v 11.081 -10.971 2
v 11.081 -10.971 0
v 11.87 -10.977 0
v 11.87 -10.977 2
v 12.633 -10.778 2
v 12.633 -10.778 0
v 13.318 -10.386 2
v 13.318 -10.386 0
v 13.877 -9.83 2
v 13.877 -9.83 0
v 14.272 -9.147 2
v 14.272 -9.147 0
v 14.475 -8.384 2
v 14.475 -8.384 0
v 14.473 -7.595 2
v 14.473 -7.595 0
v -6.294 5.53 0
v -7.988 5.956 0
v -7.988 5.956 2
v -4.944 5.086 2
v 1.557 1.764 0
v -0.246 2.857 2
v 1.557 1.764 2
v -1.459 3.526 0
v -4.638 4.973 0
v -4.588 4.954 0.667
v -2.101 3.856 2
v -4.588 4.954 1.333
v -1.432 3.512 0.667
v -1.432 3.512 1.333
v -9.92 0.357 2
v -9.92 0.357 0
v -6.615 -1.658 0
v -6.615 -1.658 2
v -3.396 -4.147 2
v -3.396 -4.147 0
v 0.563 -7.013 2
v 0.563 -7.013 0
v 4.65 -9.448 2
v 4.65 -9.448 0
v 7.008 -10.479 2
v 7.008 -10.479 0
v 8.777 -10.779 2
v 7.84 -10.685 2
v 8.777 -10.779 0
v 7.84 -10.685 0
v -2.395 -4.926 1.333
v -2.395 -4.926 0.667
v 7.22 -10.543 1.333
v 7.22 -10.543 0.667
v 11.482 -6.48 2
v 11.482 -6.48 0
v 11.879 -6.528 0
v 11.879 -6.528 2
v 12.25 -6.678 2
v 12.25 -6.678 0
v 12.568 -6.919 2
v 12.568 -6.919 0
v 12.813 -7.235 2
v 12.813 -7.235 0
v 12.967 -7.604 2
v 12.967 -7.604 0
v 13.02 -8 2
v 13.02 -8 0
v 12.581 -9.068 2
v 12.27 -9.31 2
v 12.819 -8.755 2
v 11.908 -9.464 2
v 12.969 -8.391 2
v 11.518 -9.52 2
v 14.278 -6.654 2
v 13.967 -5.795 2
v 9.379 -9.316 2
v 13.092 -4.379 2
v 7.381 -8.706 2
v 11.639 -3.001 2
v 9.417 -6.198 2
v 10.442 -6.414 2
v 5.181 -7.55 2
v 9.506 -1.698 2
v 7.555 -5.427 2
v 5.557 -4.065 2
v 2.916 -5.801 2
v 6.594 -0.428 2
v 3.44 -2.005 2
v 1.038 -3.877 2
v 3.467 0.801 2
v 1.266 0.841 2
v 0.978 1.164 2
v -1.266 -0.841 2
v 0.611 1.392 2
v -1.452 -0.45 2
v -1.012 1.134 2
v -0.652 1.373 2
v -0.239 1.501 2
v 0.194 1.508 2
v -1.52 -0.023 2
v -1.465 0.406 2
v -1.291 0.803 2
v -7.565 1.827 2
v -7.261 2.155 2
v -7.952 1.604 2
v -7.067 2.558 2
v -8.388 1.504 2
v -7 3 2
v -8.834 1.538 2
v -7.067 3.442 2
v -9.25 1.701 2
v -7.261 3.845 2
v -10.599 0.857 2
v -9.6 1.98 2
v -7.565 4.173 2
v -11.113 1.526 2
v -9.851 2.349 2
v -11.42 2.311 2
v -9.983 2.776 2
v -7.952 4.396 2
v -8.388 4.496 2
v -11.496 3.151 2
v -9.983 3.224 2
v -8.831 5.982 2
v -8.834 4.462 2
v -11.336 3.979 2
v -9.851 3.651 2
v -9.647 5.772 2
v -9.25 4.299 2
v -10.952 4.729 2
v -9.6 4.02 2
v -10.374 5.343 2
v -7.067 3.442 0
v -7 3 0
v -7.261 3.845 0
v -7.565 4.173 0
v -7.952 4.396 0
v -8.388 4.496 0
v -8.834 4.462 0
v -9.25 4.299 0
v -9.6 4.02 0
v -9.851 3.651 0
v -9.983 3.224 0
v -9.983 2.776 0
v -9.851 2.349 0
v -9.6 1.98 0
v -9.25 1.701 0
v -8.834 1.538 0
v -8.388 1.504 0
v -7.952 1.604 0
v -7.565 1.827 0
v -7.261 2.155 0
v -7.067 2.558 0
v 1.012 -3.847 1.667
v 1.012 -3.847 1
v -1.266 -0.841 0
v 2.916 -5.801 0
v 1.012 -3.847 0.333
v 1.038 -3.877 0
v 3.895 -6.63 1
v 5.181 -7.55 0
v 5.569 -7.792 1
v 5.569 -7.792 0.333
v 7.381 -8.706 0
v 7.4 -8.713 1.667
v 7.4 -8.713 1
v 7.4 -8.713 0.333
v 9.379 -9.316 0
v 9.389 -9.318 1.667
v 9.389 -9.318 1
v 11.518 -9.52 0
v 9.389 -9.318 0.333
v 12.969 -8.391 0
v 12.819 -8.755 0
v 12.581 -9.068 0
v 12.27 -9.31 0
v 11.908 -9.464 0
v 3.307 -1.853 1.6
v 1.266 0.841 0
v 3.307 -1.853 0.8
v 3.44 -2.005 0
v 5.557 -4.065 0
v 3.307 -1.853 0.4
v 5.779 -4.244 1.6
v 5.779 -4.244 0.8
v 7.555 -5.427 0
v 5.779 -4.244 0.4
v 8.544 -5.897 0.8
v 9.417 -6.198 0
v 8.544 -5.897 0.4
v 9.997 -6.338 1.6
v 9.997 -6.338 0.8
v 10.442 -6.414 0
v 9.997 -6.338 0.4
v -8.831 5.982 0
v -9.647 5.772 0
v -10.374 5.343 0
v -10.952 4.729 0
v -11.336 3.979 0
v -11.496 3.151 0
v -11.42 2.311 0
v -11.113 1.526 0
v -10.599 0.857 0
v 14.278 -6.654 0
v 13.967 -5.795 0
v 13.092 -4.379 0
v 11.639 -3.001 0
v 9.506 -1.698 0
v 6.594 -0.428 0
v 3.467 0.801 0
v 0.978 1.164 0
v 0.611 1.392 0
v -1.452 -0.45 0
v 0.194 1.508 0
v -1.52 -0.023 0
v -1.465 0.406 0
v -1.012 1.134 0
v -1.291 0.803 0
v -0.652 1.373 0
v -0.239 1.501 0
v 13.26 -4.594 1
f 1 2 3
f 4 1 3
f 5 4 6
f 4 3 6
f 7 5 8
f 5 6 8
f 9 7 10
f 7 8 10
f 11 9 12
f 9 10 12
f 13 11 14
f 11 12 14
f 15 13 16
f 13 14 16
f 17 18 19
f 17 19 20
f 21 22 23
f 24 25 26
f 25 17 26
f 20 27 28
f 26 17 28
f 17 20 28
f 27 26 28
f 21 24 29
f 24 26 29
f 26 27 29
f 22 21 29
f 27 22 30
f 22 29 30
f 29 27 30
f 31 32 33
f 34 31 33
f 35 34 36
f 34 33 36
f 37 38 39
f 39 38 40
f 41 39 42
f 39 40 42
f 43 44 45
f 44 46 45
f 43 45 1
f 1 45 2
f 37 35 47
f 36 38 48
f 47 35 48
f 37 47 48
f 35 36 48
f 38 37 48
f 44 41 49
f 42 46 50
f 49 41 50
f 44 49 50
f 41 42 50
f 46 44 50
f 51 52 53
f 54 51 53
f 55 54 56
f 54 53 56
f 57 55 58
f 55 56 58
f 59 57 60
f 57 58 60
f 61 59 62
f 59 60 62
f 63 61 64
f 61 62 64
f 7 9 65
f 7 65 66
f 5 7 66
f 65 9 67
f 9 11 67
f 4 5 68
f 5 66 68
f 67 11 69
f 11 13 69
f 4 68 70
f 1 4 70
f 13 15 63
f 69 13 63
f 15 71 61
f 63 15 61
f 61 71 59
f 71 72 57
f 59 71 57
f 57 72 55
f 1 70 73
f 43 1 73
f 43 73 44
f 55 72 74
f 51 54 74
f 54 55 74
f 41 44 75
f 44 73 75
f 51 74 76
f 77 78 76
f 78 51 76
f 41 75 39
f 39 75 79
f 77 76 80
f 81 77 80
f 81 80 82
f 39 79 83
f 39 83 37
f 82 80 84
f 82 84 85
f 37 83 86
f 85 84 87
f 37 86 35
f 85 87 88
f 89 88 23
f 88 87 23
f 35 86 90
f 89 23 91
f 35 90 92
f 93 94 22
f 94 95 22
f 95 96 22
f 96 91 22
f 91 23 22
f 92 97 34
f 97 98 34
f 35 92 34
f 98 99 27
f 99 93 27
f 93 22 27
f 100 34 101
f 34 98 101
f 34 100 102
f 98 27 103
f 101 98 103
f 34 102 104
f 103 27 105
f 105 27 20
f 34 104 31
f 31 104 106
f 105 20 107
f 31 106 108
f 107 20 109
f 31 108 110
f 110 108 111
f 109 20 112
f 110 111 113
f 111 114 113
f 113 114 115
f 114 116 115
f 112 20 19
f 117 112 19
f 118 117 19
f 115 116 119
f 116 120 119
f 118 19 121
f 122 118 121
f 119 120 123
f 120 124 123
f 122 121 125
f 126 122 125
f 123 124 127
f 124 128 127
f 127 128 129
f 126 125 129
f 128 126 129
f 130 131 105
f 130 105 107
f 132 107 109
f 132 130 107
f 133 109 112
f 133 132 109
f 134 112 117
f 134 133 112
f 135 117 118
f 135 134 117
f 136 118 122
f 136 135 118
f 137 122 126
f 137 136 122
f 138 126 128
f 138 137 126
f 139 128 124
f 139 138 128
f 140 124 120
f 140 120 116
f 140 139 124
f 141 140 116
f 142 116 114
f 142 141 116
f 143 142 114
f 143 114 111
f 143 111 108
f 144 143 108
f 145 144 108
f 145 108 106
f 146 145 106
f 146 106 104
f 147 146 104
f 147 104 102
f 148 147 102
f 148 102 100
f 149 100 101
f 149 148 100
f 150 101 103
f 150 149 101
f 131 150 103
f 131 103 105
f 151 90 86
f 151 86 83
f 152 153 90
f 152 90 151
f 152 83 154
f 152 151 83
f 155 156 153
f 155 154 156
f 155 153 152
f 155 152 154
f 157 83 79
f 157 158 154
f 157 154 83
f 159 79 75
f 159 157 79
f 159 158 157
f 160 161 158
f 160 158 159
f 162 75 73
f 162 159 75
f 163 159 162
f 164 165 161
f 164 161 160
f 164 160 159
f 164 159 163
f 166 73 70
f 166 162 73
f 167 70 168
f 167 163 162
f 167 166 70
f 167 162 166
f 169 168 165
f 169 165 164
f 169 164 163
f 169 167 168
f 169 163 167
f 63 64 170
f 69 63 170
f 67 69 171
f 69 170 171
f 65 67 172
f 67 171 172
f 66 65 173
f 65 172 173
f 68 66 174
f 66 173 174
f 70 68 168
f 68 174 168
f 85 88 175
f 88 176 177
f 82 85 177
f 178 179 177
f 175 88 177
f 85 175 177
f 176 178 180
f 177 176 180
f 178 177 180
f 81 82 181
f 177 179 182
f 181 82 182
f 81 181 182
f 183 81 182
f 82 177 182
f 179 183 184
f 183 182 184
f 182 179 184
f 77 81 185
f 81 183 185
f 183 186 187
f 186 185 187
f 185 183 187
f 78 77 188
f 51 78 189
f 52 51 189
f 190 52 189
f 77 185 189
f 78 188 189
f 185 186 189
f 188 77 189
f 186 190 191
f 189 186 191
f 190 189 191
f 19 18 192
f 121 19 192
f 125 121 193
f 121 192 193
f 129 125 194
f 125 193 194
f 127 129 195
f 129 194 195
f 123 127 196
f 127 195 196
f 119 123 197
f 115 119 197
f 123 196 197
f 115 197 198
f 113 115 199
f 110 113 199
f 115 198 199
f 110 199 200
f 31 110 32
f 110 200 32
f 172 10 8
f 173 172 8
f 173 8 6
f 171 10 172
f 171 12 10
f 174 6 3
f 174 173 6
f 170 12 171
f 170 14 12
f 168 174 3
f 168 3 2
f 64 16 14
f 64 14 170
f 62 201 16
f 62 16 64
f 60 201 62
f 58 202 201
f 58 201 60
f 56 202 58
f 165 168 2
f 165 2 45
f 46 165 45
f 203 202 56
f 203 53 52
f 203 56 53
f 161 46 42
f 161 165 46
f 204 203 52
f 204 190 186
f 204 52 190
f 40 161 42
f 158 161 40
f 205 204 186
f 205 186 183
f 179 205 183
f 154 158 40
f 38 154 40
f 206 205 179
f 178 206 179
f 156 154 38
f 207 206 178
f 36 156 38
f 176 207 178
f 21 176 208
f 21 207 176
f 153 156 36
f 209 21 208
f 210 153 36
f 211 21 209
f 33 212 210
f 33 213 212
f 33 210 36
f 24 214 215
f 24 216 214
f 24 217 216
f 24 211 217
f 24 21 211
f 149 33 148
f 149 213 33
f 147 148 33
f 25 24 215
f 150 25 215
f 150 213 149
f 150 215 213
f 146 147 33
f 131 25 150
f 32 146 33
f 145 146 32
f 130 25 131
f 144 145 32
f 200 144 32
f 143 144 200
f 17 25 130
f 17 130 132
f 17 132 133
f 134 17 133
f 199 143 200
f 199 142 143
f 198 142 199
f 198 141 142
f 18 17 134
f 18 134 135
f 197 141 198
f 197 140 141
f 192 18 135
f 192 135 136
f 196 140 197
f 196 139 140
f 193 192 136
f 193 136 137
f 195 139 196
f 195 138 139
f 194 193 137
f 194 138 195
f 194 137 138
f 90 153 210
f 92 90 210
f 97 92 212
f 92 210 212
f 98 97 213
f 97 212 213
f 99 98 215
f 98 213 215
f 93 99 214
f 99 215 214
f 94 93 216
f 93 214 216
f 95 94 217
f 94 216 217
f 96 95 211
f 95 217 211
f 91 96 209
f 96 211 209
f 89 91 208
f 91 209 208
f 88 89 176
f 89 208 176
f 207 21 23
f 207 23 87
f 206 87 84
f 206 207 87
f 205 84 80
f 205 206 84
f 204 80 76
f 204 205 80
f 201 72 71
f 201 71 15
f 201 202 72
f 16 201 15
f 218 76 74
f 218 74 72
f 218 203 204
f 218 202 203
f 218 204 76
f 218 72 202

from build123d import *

# Parameters (mm, degrees)
SKETCH_1_R          = 1.5
EXTRUDE_1_DEPTH     = 2
EXTRUDE_START       = -2
EXTRUDE_2_DEPTH     = 2
CUT_EXTRUDE_6_DEPTH = 10
EXTRUDE_3_DEPTH     = 2


with BuildPart() as part:
    # 草图1 → 凸台-拉伸1 (new body)
    with BuildSketch(Plane.XY):
        with BuildLine():
            add(Edge.make_bspline(
                [(-7.987888182, 5.955967098), (-3.743831448, 6.072814335), (1.964500208, 2.606366835), (9.971098404, -1.64370968), (11.281519782, -4.915475191), (12.099924554, -5.060596909)],
                knots=[0, 0, 0, 0, 0.492049643, 0.9167731, 1, 1, 1, 1], degree=3))
            ThreePointArc((-7.987888182, 5.955967098), (-11.335902649, 3.978599082), (-9.919857427, 0.35727321))
            add(Edge.make_bspline(
                [(-9.919857427, 0.35727321), (-6.214513301, -1.633496474), (-3.207757144, -4.777239805), (7.078147627, -11.27345607), (9.126976019, -10.694820948), (11.080759462, -10.970561794)],
                knots=[0, 0, 0, 0, 0.359134016, 0.783116461, 1, 1, 1, 1], degree=3))
            ThreePointArc((11.080759462, -10.970561794), (14.456363123, -8.509820643), (12.099924554, -5.060596909))
        make_face()
        with BuildLine():
            ThreePointArc((-1.266260939, -0.840822951), (-0.840822951, 1.266260939), (1.266260939, 0.840822951))
            add(Edge.make_bspline(
                [(1.266260939, 0.840822951), (1.572421217, 0.37975228), (2.2006023, -0.51199535), (3.651531179, -2.318328255), (5.731244794, -4.36936802), (8.515750536, -6.078268968), (10.483635949, -6.491801521), (11.482195768, -6.480104277)],
                knots=[0, 0, 0, 0, 0.125, 0.25, 0.5, 0.75, 1, 1, 1, 1], degree=3))
            ThreePointArc((11.482195768, -6.480104277), (12.568489019, -6.918921272), (13.02, -8))
            ThreePointArc((13.02, -8), (12.581078728, -9.068489019), (11.517804232, -9.519895723))
            add(Edge.make_bspline(
                [(-1.266260939, -0.840822951), (-0.926702959, -1.352189828), (-0.233155533, -2.337077502), (1.395542848, -4.364895632), (3.78940322, -6.741408475), (6.71258634, -8.559402396), (9.358185118, -9.384824122), (10.805124931, -9.52824413), (11.517804232, -9.519895723)],
                knots=[0, 0, 0, 0, 0.125, 0.25, 0.5, 0.75, 0.875, 1, 1, 1, 1], degree=3))
        make_face(mode=Mode.SUBTRACT)
        with Locations((-8.5, 3)):
            Circle(SKETCH_1_R, mode=Mode.SUBTRACT)
    extrude(amount=EXTRUDE_1_DEPTH)

    # 草图2 → 凸台-拉伸2 (add)
    with BuildSketch(Plane.XY.offset(2).offset(EXTRUDE_START)):
        with BuildLine():
            ThreePointArc((12.382013346, -5.132587847), (12.241842746, -5.093168505), (12.099924554, -5.060596909))
            add(Edge.make_bspline(
                [(12.099924554, -5.060596909), (11.281519782, -4.915475191), (10.976298239, -4.153420073), (10.521531787, -3.451743028), (10.374807656, -3.248589277)],
                knots=[0, 0, 0, 0, 0.0832269, 0.118311098, 0.118311098, 0.118311098, 0.118311098], degree=3))
            add(Edge.make_bspline(
                [(10.374807656, -3.248589277), (10.663783201, -3.648703868), (11.898898367, -4.983982122), (12.382013346, -5.132587847)],
                knots=[0, 0, 0, 0, 1, 1, 1, 1], degree=3))
        make_face()
    extrude(amount=EXTRUDE_2_DEPTH)

    # 草图7 → 切除-拉伸6 (cut)
    with BuildSketch(Plane.XY.offset(2)):
        with BuildLine():
            Line((-7.987888182, 5.955967098), (1.266062019, 11.163030358))
            Line((1.266062019, 11.163030358), (12.382013346, -5.132587847))
            add(Edge.make_bspline(
                [(-7.987888182, 5.955967098), (-0.077844738, 4.310798263), (5.452050398, -1.616496795), (12.382013346, -5.132587847)],
                knots=[0, 0, 0, 0, 1, 1, 1, 1], degree=3))
        make_face()
    extrude(amount=-CUT_EXTRUDE_6_DEPTH, mode=Mode.SUBTRACT)

    # 草图8 → 凸台-拉伸3 (add)
    with BuildSketch(Plane.XY.offset(2).offset(EXTRUDE_START)):
        with BuildLine():
            ThreePointArc((14.472568825, -7.595235155), (13.787052442, -6.058508015), (12.382013346, -5.132587847))
            add(Edge.make_bspline(
                [(12.382013346, -5.132587847), (12.317985887, -5.112893059), (12.24075005, -5.072355166), (12.154258782, -5.015913393)],
                knots=[0, 0, 0, 0, 0.132530478, 0.132530478, 0.132530478, 0.132530478], degree=3))
            add(Edge.make_bspline(
                [(12.154258782, -5.015913393), (8.423758186, -3.086650873), (5.090409864, -0.473998081), (1.556721967, 1.76411334)],
                knots=[0, 0, 0, 0, 0.540677693, 0.540677693, 0.540677693, 0.540677693], degree=3))
            add(Edge.make_bspline(
                [(1.556721967, 1.76411334), (4.495628992, -0.097285168), (12.132556571, -1.344060553), (14.312894291, -6.422594924), (14.472568825, -7.595235155)],
                knots=[0, 0, 0, 0, 0.805722027, 1, 1, 1, 1], degree=3))
        make_face()
    extrude(amount=EXTRUDE_3_DEPTH)


solid = part.part
